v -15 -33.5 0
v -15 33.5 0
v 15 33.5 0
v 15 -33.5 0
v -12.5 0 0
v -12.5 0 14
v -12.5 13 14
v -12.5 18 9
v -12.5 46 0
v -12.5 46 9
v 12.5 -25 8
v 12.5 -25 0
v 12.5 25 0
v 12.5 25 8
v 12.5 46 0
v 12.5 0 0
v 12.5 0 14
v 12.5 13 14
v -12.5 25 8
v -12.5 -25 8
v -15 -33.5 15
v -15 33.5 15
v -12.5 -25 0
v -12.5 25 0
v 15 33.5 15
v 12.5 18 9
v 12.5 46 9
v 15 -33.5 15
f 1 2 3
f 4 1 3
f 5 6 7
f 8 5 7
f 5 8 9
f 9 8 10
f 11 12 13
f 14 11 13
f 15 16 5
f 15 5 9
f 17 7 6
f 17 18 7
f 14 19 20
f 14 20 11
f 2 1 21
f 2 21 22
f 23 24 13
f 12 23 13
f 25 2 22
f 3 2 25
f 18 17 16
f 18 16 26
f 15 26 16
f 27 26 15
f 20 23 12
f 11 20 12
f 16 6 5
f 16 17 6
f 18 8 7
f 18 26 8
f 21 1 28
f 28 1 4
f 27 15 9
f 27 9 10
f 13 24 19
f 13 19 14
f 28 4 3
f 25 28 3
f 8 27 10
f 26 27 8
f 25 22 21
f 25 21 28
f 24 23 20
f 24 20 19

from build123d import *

# Parameters (mm, degrees)
F1_DEPTH = 12.5
F2_W     = 30
F2_H     = 67
F3_DEPTH = 15
F4_W     = 25
F4_H     = 50
F5_DEPTH = 8


with BuildPart() as f1:
    # F0 (on Right) → F1 (new body, symmetric)
    with BuildSketch(Plane.YZ):
        Polygon((0, 14), (0, 0), (46, 0), (46, 9), (18, 9), (13, 14), align=None)
    extrude(amount=F1_DEPTH, both=True)


with BuildPart() as f3:
    # F2 (on Top) → F3 (new body)
    with BuildSketch(Plane.XY):
        Rectangle(F2_W, F2_H)
    extrude(amount=F3_DEPTH)


with BuildPart() as f5:
    # F4 (on Top) → F5 (new body)
    with BuildSketch(Plane.XY):
        Rectangle(F4_W, F4_H)
    extrude(amount=F5_DEPTH)


solid = Compound([f1.part, f3.part, f5.part])
